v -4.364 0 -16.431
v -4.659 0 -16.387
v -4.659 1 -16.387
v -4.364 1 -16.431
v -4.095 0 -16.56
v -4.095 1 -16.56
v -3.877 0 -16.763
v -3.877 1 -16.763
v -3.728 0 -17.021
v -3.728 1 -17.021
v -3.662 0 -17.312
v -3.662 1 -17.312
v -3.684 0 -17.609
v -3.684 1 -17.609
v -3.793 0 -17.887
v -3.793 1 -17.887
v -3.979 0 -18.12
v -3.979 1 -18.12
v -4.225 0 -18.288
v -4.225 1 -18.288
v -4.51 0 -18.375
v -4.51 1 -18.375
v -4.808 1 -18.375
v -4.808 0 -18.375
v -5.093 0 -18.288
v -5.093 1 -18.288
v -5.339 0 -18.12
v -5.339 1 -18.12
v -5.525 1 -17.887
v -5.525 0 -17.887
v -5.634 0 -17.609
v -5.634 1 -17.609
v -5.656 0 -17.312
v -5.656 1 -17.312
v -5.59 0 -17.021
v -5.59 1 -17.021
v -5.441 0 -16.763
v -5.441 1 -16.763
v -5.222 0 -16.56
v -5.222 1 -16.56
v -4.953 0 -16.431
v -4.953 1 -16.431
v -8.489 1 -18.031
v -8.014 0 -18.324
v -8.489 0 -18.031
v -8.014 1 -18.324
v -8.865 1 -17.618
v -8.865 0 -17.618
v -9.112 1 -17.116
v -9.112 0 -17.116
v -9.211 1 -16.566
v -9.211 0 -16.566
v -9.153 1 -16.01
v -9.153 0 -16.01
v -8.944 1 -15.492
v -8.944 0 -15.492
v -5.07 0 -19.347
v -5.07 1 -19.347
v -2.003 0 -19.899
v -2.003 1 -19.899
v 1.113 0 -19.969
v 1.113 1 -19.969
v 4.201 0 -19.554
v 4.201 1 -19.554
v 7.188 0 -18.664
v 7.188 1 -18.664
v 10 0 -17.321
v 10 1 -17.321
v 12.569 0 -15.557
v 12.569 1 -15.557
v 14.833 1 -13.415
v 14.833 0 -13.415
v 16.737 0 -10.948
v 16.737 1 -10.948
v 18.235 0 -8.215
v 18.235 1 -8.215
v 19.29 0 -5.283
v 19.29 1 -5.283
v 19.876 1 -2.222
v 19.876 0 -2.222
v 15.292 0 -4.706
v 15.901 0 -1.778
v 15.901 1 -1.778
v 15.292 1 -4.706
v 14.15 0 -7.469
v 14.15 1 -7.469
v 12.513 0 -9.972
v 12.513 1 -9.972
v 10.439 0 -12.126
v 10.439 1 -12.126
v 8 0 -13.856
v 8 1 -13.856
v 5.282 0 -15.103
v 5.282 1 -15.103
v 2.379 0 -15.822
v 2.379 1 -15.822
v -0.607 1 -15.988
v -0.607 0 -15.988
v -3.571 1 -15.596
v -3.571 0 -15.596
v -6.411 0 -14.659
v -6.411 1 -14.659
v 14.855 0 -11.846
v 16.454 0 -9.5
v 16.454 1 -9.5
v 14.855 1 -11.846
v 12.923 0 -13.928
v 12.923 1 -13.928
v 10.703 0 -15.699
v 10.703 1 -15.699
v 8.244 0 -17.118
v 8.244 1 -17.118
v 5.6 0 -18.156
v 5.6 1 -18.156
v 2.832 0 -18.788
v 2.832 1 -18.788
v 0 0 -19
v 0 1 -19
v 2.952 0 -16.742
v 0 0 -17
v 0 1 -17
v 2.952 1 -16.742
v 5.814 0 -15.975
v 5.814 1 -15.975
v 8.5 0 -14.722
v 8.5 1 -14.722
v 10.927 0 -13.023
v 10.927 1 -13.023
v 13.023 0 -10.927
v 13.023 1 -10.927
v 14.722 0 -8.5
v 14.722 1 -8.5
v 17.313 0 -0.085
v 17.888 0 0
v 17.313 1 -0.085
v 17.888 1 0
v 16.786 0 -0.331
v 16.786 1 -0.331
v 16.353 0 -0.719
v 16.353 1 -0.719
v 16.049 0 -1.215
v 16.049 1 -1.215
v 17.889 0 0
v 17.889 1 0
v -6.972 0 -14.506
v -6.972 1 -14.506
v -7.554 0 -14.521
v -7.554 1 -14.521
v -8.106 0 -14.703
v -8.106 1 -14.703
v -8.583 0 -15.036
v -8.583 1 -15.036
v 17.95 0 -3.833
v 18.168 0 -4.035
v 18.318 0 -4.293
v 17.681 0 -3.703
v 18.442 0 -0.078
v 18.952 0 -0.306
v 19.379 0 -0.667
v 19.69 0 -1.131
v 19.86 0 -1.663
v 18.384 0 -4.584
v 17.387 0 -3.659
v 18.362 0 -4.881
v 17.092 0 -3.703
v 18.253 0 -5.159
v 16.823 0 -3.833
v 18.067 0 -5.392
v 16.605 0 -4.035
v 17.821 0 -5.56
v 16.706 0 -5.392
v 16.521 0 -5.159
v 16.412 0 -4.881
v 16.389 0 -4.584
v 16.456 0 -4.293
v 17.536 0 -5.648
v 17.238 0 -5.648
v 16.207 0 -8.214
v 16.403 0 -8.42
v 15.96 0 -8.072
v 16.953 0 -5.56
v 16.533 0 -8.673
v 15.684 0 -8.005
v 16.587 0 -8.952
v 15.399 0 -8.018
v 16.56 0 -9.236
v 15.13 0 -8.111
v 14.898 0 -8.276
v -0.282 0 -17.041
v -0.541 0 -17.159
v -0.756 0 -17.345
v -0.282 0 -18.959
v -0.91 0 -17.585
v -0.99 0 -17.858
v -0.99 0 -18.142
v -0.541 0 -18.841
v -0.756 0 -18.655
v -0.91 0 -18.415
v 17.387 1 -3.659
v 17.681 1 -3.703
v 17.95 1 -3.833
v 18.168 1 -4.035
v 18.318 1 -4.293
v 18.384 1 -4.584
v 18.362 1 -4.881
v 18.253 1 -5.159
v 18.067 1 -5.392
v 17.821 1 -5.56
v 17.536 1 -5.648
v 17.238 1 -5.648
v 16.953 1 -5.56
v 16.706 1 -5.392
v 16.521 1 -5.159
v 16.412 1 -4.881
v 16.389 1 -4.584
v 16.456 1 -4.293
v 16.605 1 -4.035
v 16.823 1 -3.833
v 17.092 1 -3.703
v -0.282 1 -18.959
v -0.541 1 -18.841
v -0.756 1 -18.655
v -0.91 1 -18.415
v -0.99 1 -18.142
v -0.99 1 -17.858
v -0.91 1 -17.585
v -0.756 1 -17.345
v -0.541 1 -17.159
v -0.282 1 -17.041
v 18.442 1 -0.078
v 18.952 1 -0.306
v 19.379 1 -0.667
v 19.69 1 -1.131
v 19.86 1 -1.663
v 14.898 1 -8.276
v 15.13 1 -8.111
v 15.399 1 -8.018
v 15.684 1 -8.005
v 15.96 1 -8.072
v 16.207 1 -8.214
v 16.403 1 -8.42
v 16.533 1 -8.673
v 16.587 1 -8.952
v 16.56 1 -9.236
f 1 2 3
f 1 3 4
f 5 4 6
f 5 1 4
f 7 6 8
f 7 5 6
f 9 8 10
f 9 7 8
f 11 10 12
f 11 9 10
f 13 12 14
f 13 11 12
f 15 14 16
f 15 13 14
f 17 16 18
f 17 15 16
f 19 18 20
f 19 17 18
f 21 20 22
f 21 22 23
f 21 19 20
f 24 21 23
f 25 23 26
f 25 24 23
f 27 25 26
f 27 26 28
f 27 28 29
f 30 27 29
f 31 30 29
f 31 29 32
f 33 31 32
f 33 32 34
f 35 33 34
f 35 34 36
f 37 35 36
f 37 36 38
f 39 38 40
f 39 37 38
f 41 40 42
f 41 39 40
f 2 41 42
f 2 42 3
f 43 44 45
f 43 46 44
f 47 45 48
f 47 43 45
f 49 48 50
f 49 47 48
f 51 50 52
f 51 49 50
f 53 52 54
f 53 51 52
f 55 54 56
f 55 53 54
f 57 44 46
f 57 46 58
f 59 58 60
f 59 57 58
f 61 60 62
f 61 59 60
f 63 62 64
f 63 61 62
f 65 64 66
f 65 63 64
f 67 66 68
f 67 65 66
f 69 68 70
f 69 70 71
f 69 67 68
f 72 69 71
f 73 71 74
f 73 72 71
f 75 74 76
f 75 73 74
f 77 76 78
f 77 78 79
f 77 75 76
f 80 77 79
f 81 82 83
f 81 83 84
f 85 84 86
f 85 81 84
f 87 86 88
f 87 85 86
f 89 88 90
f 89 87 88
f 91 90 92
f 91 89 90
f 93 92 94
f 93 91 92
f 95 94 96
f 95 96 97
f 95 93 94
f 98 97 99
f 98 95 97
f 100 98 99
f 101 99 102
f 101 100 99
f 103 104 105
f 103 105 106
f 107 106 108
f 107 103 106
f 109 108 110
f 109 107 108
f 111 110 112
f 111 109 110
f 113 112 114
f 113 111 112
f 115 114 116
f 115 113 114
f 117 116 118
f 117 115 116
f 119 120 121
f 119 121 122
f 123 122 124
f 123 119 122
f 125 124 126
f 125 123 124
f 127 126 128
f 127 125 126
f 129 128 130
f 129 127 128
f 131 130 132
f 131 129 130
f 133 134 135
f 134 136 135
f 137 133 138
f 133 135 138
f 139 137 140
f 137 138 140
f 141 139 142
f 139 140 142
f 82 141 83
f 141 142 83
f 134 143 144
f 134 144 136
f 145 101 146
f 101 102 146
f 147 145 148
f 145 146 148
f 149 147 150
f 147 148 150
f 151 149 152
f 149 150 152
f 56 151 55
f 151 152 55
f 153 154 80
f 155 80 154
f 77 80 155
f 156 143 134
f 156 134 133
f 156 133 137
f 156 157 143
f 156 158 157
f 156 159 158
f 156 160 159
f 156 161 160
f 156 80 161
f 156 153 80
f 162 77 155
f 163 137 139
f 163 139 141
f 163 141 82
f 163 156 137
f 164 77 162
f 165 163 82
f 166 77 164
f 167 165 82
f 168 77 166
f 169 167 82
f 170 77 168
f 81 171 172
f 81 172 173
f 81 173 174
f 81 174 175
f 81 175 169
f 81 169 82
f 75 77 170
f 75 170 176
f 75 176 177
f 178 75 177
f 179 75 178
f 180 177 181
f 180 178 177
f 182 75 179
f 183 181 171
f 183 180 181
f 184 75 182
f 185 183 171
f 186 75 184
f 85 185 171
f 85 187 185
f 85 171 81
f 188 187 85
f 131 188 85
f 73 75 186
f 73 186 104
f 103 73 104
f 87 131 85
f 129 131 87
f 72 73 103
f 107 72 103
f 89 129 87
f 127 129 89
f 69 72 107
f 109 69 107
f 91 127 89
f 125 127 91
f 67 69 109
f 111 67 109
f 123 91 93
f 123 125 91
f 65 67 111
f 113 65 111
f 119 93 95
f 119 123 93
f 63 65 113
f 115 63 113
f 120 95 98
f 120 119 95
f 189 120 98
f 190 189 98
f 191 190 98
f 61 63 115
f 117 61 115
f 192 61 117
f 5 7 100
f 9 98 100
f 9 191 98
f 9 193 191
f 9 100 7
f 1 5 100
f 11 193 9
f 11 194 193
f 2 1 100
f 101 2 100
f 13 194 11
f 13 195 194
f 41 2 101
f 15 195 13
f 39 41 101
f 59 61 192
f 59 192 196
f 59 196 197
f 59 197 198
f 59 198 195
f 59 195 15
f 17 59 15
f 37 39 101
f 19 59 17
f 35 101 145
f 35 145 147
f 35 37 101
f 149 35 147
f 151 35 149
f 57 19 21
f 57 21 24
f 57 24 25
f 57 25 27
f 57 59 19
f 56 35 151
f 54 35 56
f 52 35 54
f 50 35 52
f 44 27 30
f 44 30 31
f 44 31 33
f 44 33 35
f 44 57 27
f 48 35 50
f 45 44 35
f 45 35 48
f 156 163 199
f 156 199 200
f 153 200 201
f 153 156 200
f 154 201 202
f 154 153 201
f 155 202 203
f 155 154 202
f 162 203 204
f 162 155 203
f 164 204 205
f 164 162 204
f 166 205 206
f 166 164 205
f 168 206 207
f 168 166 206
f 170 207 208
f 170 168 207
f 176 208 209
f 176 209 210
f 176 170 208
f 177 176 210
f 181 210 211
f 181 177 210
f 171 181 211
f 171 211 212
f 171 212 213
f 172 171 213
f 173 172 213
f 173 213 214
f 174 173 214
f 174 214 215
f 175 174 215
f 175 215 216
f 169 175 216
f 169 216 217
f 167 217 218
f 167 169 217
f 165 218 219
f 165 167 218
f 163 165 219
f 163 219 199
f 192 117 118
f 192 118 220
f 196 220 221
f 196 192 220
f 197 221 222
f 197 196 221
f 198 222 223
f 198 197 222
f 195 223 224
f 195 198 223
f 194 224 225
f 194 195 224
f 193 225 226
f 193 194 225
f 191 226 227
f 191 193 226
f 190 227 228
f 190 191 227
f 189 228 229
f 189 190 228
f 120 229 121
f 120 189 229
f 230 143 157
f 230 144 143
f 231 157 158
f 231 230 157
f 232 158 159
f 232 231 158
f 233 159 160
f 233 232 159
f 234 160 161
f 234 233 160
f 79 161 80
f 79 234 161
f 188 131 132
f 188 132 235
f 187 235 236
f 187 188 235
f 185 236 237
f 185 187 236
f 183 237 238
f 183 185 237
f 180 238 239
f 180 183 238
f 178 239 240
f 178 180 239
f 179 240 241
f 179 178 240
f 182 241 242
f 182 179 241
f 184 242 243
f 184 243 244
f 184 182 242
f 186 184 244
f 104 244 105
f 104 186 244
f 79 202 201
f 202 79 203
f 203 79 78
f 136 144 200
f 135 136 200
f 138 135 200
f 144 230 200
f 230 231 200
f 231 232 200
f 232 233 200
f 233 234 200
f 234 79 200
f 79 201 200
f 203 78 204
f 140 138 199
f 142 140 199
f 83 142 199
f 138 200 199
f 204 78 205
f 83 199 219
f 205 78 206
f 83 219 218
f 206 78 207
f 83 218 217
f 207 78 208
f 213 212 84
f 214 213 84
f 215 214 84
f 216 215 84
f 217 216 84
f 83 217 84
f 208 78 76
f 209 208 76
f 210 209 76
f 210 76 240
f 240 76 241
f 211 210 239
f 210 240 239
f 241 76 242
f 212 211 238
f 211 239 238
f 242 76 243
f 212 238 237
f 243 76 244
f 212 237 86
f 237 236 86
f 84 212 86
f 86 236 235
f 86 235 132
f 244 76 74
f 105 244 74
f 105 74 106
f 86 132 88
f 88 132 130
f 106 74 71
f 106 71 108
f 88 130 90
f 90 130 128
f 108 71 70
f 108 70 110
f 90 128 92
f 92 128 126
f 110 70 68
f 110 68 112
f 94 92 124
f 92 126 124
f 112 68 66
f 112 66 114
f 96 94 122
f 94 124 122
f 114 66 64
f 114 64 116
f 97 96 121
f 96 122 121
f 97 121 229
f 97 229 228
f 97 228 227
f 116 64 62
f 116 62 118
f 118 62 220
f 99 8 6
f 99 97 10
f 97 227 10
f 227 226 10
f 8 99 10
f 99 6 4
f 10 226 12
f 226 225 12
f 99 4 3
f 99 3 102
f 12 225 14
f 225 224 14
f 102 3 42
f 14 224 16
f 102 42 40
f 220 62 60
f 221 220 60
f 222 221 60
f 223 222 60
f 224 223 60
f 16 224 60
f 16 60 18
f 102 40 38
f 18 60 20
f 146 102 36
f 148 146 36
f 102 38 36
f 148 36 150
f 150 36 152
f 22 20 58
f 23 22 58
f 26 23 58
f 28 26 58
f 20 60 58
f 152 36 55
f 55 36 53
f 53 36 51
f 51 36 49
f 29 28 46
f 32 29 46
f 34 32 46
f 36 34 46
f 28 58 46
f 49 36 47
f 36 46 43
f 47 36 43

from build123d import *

# Parameters (mm, degrees)
SKETCH_1_R      = 1
EXTRUDE_1_DEPTH = 1
FILLET_1_R      = 2


with BuildPart() as part:
    # 草图1 → 凸台-拉伸1 (new body)
    with BuildSketch(Plane(origin=(0, 0, 0), x_dir=(1, 0, 0), z_dir=(0, 1, 0))):
        with BuildLine():
            Line((20, 0), (16, 0))
            ThreePointArc((16, 0), (8, 13.856406461), (-8, 13.856406461))
            Line((-8, 13.856406461), (-10, 17.320508076))
            ThreePointArc((-10, 17.320508076), (10, 17.320508076), (20, 0))
        make_face()
        with Locations(Location((-4.658742812, 17.386664873, 0), (0, 0, 270))):
            Circle(SKETCH_1_R, mode=Mode.SUBTRACT)
        with Locations(Location((17.386664873, 4.658742812, 0), (0, 0, 270))):
            Circle(SKETCH_1_R, mode=Mode.SUBTRACT)
        with BuildLine():
            ThreePointArc((16.454482672, 9.5), (9.5, 16.454482672), (0, 19))
            ThreePointArc((0, 19), (-1, 18), (0, 17))
            ThreePointArc((0, 17), (8.5, 14.722431864), (14.722431864, 8.5))
            ThreePointArc((14.722431864, 8.5), (16.088457268, 8.133974596), (16.454482672, 9.5))
        make_face(mode=Mode.SUBTRACT)
    extrude(amount=EXTRUDE_1_DEPTH)

    # 圆角1
    fillet_1_edges = [part.edges().sort_by_distance(p)[0] for p in [
        (-8, 0.5, -13.856406461),
        (-10, 0.5, -17.320508076),
        (16, 0.5, 0),
        (20, 0.5, 0),
    ]]
    fillet(fillet_1_edges, radius=FILLET_1_R - 0.0001)  # a hair under: the kernel refuses the full size


solid = part.part
